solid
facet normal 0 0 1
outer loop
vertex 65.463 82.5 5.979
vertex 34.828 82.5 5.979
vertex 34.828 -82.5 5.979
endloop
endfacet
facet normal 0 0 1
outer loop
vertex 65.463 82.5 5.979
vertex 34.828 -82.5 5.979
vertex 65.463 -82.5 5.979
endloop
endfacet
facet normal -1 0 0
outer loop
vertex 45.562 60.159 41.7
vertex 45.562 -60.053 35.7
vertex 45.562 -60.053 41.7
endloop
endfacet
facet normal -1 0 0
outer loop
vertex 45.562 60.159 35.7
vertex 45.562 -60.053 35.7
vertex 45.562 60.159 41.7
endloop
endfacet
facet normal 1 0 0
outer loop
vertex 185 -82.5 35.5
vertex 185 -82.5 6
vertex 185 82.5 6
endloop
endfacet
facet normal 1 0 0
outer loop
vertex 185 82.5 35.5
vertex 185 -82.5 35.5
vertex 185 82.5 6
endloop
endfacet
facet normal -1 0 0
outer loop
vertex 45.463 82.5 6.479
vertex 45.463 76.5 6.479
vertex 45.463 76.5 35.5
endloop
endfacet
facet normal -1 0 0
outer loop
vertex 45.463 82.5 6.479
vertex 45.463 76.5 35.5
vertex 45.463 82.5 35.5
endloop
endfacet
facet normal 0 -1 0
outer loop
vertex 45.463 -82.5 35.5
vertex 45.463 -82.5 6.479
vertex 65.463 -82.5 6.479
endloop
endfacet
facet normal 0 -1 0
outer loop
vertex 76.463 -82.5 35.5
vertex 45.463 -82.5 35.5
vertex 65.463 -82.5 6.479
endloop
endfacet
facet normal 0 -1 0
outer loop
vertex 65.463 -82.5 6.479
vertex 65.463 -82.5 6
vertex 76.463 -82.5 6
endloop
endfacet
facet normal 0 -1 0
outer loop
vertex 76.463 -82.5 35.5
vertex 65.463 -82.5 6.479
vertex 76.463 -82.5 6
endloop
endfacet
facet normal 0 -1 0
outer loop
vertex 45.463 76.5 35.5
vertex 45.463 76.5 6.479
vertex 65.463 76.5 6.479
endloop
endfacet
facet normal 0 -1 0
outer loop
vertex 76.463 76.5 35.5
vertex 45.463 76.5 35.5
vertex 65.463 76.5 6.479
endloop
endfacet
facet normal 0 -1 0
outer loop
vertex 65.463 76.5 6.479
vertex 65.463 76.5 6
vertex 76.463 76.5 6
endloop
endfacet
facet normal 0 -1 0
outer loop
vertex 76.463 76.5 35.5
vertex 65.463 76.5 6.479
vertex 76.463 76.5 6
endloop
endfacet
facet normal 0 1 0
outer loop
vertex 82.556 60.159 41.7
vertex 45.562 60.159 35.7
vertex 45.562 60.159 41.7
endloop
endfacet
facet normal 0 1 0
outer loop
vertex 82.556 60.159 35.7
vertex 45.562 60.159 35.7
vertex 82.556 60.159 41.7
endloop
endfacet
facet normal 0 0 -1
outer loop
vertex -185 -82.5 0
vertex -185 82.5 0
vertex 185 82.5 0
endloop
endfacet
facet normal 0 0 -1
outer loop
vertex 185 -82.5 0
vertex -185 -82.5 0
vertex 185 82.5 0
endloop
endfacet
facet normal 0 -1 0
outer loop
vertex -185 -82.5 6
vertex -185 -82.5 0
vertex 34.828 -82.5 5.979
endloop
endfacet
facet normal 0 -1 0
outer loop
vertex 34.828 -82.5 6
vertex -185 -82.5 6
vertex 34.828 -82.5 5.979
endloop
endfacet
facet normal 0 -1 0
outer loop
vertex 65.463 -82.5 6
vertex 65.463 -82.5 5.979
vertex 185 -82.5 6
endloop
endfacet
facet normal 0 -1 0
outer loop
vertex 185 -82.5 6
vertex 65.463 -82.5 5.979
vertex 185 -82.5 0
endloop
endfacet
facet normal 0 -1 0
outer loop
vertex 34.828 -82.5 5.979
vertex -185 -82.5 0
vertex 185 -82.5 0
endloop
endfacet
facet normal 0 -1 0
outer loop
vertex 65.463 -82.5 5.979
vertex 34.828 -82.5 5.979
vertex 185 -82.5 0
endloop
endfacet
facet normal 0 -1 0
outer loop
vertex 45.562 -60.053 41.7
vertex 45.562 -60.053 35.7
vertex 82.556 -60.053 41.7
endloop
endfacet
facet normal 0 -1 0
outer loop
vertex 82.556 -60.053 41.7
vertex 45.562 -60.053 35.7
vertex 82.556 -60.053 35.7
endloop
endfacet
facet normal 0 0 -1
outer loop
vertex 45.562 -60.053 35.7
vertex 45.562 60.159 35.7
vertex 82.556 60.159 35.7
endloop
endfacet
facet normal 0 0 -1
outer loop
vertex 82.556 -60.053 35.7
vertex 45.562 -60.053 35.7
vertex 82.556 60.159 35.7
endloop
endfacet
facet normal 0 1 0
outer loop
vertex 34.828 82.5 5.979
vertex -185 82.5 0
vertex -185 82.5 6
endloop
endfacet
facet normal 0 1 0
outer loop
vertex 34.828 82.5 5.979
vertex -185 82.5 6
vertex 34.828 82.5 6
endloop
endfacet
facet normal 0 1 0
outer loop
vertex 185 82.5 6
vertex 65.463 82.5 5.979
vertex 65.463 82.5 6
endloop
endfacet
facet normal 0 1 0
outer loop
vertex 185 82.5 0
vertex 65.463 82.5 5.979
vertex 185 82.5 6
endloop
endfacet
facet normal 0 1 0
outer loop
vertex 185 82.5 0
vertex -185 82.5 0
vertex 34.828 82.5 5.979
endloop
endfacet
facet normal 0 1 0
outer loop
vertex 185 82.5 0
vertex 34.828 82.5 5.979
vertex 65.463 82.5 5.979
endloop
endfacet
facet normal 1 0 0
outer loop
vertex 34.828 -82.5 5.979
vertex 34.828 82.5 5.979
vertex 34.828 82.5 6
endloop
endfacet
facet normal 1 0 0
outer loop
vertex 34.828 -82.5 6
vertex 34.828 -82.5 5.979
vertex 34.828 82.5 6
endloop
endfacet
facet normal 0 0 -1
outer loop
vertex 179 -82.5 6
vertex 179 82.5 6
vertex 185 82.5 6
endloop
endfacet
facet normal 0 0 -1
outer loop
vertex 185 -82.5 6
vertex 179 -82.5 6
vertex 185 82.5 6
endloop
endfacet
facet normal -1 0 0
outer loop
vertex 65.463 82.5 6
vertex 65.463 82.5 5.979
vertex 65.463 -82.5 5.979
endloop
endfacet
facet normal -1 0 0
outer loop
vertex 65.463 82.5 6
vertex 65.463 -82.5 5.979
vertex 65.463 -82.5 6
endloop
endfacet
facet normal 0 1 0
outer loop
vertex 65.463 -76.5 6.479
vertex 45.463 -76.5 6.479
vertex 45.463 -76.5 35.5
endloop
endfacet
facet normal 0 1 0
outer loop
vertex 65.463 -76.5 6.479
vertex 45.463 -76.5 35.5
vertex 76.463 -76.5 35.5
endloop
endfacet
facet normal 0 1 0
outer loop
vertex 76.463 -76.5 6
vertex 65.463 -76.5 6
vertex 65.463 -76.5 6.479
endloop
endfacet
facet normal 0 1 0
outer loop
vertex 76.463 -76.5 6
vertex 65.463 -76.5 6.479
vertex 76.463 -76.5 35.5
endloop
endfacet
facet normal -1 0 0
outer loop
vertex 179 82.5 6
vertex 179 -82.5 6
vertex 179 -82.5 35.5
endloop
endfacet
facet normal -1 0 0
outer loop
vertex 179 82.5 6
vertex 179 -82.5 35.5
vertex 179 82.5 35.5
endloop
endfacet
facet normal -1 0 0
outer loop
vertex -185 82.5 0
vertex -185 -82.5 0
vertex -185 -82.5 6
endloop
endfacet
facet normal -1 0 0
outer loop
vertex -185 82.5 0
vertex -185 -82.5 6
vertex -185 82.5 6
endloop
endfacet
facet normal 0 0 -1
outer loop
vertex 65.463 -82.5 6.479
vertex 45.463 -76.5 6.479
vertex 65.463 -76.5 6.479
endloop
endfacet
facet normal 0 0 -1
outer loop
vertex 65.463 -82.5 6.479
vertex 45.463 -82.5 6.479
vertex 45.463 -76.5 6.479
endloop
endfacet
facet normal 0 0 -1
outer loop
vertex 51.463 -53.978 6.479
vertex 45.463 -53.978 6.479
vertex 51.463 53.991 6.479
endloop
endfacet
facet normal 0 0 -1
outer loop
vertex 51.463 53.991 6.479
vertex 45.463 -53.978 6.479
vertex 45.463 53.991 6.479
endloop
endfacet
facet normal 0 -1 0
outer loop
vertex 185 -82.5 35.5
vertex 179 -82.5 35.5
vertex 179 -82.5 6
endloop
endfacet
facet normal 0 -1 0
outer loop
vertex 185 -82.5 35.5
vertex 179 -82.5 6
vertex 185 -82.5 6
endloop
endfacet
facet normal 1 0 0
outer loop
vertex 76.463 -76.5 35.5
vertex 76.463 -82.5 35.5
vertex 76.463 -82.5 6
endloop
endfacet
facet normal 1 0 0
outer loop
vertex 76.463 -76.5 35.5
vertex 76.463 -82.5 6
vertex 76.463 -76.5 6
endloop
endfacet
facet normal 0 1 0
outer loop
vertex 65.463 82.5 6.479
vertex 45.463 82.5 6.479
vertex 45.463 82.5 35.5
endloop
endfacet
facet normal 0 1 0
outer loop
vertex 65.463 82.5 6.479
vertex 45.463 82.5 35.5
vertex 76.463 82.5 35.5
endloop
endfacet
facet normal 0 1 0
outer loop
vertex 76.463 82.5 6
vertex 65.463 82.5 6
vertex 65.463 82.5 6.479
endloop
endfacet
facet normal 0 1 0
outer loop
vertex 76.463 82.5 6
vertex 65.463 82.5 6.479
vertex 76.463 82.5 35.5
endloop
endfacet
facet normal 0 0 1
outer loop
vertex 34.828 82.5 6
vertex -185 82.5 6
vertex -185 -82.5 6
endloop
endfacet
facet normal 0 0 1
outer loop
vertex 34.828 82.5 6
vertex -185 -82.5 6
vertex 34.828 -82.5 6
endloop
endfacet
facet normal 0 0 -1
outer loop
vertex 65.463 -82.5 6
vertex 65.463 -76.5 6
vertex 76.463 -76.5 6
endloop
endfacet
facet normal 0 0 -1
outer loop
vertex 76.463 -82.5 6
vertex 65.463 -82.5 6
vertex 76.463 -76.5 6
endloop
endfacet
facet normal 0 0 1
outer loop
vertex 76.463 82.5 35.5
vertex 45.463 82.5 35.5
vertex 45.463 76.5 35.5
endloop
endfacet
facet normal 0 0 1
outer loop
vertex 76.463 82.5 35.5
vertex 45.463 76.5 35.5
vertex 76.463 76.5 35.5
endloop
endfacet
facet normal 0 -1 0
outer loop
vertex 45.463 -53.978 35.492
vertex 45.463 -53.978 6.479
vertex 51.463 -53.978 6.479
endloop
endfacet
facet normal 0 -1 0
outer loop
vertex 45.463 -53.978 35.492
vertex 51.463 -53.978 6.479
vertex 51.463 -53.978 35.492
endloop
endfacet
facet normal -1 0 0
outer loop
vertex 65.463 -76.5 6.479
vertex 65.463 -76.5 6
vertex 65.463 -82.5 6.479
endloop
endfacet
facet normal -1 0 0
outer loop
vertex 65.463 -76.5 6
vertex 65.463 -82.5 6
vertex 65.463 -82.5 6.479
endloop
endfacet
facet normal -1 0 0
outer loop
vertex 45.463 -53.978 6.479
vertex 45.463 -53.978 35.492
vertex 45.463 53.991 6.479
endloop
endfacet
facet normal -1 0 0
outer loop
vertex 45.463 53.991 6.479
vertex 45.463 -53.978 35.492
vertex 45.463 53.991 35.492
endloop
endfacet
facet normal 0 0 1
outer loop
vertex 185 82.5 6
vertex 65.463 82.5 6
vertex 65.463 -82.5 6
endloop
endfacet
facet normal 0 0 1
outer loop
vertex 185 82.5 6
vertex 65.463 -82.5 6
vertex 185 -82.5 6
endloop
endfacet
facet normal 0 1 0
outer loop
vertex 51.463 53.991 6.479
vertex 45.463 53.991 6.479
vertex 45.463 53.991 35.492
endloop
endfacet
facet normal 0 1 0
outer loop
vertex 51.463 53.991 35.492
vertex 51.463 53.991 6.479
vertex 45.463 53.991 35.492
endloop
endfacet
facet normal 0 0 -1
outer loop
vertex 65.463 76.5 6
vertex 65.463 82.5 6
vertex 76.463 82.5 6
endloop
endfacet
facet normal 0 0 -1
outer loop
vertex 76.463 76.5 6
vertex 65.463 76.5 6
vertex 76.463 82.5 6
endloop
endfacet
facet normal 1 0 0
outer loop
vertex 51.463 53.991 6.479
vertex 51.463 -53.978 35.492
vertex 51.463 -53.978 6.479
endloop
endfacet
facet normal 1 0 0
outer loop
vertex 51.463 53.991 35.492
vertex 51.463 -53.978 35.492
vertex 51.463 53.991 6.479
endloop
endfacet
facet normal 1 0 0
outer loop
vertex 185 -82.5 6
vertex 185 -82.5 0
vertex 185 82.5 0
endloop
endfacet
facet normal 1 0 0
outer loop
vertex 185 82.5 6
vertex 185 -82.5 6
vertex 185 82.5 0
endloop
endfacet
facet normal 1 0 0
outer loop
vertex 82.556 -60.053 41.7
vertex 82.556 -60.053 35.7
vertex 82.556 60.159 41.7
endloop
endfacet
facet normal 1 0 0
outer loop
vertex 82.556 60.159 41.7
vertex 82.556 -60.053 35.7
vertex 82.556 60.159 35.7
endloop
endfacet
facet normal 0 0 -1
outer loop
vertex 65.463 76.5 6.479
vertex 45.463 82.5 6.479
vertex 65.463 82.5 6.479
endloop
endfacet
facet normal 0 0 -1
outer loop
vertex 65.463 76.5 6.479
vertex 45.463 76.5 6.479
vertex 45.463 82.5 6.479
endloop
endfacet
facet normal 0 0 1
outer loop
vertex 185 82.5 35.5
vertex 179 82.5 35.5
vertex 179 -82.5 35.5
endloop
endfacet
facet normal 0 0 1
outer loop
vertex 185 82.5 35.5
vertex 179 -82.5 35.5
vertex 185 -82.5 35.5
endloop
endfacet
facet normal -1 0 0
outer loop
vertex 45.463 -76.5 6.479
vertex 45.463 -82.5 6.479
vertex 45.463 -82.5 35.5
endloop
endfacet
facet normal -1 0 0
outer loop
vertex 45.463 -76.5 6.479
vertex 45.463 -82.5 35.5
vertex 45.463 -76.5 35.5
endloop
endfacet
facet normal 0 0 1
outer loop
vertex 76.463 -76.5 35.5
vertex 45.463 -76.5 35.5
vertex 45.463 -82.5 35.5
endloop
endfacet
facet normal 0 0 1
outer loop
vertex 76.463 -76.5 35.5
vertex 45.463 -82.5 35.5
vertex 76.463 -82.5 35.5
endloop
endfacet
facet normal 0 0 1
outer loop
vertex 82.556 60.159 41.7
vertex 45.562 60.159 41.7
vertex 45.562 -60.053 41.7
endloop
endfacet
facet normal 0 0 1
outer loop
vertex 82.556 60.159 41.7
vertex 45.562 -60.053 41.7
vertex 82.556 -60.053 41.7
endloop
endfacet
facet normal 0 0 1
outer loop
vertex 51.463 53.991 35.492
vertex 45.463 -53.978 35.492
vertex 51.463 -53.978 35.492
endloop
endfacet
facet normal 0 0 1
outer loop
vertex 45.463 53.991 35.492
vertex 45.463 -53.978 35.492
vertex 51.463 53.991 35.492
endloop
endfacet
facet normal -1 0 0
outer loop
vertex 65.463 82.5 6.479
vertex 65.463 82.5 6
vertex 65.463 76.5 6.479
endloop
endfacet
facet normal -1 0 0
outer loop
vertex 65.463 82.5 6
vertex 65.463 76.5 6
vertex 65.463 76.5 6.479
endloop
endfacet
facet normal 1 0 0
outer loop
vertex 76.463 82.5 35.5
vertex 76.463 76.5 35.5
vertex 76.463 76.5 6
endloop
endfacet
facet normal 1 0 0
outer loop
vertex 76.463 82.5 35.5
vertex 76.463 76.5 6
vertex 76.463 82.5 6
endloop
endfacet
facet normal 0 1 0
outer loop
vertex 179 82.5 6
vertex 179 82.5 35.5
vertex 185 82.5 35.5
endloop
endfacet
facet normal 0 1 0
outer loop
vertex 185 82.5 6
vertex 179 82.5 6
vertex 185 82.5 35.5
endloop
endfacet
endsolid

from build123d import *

# Parameters (mm, degrees)
F0_W      = 370
F0_H      = 165
F1_DEPTH  = 6
F2_W      = 6
F2_H      = 165
F3_DEPTH  = 29.5
F4_W      = 31
F4_H      = 6
F5_DEPTH  = 29.5
F6_W      = 30.6351519525
F6_H      = 0.5
F7_DEPTH  = 150
F9_W      = 107.9691536725
F9_H      = 29.012885876
F10_DEPTH = 6
F12_W     = 36.9944125414
F12_H     = 120.2112324536
F13_DEPTH = 6


with BuildPart() as f1:
    # F0 (on Top) → F1 (new body)
    with BuildSketch(Plane.XY):
        Rectangle(F0_W, F0_H)
    extrude(amount=F1_DEPTH)


with BuildPart() as f3:
    # F2 (on face) → F3 (new body)
    with BuildSketch(Plane.XY.offset(6)):
        with Locations((182, 0)):
            Rectangle(F2_W, F2_H)
    extrude(amount=F3_DEPTH)


with BuildPart() as f5:
    # F4 (on face) → F5 (new body, through all)
    with BuildSketch(Plane.XY.offset(6)):
        with Locations((60.9634758234, -79.5)):
            Rectangle(F4_W, F4_H)
    extrude(amount=F5_DEPTH)


with BuildPart() as f5b:
    # F4 (on face) → F5, piece 2 (new body, through all)
    with BuildSketch(Plane.XY.offset(6)):
        with Locations((60.9634758234, 79.5)):
            Rectangle(F4_W, F4_H)
    extrude(amount=F5_DEPTH)


with BuildPart() as f7_tool:
    # F6 (on Front) → F7 (new body, symmetric)
    with BuildSketch(Plane.XZ):
        with Locations((50.1458998471, 6.2288549207)):
            Rectangle(F6_W, F6_H)
    extrude(amount=F7_DEPTH, both=True)


with BuildPart() as f1_1:
    add(f1.part)

    # F7: cut by f7_tool
    add(f7_tool.part, mode=Mode.SUBTRACT)


with BuildPart() as f5_1:
    add(f5.part)

    # F7: cut by f7_tool
    add(f7_tool.part, mode=Mode.SUBTRACT)


with BuildPart() as f5b_1:
    add(f5b.part)

    # F7: cut by f7_tool
    add(f7_tool.part, mode=Mode.SUBTRACT)


with BuildPart() as f10:
    # F9 (on plane+point) → F10 (new body)
    with BuildSketch(Plane.YZ.offset(45.4634758234)):
        with Locations((0.0067185611, 20.9854966961)):
            Rectangle(F9_W, F9_H)
    extrude(amount=F10_DEPTH)


with BuildPart() as f13:
    # F12 (on offset) → F13 (new body)
    with BuildSketch(Plane.XY.offset(35.7)):
        with Locations((64.0589296818, 0.0530425459)):
            Rectangle(F12_W, F12_H)
    extrude(amount=F13_DEPTH)


solid = Compound([f3.part, f1_1.part, f5_1.part, f5b_1.part, f10.part, f13.part])
